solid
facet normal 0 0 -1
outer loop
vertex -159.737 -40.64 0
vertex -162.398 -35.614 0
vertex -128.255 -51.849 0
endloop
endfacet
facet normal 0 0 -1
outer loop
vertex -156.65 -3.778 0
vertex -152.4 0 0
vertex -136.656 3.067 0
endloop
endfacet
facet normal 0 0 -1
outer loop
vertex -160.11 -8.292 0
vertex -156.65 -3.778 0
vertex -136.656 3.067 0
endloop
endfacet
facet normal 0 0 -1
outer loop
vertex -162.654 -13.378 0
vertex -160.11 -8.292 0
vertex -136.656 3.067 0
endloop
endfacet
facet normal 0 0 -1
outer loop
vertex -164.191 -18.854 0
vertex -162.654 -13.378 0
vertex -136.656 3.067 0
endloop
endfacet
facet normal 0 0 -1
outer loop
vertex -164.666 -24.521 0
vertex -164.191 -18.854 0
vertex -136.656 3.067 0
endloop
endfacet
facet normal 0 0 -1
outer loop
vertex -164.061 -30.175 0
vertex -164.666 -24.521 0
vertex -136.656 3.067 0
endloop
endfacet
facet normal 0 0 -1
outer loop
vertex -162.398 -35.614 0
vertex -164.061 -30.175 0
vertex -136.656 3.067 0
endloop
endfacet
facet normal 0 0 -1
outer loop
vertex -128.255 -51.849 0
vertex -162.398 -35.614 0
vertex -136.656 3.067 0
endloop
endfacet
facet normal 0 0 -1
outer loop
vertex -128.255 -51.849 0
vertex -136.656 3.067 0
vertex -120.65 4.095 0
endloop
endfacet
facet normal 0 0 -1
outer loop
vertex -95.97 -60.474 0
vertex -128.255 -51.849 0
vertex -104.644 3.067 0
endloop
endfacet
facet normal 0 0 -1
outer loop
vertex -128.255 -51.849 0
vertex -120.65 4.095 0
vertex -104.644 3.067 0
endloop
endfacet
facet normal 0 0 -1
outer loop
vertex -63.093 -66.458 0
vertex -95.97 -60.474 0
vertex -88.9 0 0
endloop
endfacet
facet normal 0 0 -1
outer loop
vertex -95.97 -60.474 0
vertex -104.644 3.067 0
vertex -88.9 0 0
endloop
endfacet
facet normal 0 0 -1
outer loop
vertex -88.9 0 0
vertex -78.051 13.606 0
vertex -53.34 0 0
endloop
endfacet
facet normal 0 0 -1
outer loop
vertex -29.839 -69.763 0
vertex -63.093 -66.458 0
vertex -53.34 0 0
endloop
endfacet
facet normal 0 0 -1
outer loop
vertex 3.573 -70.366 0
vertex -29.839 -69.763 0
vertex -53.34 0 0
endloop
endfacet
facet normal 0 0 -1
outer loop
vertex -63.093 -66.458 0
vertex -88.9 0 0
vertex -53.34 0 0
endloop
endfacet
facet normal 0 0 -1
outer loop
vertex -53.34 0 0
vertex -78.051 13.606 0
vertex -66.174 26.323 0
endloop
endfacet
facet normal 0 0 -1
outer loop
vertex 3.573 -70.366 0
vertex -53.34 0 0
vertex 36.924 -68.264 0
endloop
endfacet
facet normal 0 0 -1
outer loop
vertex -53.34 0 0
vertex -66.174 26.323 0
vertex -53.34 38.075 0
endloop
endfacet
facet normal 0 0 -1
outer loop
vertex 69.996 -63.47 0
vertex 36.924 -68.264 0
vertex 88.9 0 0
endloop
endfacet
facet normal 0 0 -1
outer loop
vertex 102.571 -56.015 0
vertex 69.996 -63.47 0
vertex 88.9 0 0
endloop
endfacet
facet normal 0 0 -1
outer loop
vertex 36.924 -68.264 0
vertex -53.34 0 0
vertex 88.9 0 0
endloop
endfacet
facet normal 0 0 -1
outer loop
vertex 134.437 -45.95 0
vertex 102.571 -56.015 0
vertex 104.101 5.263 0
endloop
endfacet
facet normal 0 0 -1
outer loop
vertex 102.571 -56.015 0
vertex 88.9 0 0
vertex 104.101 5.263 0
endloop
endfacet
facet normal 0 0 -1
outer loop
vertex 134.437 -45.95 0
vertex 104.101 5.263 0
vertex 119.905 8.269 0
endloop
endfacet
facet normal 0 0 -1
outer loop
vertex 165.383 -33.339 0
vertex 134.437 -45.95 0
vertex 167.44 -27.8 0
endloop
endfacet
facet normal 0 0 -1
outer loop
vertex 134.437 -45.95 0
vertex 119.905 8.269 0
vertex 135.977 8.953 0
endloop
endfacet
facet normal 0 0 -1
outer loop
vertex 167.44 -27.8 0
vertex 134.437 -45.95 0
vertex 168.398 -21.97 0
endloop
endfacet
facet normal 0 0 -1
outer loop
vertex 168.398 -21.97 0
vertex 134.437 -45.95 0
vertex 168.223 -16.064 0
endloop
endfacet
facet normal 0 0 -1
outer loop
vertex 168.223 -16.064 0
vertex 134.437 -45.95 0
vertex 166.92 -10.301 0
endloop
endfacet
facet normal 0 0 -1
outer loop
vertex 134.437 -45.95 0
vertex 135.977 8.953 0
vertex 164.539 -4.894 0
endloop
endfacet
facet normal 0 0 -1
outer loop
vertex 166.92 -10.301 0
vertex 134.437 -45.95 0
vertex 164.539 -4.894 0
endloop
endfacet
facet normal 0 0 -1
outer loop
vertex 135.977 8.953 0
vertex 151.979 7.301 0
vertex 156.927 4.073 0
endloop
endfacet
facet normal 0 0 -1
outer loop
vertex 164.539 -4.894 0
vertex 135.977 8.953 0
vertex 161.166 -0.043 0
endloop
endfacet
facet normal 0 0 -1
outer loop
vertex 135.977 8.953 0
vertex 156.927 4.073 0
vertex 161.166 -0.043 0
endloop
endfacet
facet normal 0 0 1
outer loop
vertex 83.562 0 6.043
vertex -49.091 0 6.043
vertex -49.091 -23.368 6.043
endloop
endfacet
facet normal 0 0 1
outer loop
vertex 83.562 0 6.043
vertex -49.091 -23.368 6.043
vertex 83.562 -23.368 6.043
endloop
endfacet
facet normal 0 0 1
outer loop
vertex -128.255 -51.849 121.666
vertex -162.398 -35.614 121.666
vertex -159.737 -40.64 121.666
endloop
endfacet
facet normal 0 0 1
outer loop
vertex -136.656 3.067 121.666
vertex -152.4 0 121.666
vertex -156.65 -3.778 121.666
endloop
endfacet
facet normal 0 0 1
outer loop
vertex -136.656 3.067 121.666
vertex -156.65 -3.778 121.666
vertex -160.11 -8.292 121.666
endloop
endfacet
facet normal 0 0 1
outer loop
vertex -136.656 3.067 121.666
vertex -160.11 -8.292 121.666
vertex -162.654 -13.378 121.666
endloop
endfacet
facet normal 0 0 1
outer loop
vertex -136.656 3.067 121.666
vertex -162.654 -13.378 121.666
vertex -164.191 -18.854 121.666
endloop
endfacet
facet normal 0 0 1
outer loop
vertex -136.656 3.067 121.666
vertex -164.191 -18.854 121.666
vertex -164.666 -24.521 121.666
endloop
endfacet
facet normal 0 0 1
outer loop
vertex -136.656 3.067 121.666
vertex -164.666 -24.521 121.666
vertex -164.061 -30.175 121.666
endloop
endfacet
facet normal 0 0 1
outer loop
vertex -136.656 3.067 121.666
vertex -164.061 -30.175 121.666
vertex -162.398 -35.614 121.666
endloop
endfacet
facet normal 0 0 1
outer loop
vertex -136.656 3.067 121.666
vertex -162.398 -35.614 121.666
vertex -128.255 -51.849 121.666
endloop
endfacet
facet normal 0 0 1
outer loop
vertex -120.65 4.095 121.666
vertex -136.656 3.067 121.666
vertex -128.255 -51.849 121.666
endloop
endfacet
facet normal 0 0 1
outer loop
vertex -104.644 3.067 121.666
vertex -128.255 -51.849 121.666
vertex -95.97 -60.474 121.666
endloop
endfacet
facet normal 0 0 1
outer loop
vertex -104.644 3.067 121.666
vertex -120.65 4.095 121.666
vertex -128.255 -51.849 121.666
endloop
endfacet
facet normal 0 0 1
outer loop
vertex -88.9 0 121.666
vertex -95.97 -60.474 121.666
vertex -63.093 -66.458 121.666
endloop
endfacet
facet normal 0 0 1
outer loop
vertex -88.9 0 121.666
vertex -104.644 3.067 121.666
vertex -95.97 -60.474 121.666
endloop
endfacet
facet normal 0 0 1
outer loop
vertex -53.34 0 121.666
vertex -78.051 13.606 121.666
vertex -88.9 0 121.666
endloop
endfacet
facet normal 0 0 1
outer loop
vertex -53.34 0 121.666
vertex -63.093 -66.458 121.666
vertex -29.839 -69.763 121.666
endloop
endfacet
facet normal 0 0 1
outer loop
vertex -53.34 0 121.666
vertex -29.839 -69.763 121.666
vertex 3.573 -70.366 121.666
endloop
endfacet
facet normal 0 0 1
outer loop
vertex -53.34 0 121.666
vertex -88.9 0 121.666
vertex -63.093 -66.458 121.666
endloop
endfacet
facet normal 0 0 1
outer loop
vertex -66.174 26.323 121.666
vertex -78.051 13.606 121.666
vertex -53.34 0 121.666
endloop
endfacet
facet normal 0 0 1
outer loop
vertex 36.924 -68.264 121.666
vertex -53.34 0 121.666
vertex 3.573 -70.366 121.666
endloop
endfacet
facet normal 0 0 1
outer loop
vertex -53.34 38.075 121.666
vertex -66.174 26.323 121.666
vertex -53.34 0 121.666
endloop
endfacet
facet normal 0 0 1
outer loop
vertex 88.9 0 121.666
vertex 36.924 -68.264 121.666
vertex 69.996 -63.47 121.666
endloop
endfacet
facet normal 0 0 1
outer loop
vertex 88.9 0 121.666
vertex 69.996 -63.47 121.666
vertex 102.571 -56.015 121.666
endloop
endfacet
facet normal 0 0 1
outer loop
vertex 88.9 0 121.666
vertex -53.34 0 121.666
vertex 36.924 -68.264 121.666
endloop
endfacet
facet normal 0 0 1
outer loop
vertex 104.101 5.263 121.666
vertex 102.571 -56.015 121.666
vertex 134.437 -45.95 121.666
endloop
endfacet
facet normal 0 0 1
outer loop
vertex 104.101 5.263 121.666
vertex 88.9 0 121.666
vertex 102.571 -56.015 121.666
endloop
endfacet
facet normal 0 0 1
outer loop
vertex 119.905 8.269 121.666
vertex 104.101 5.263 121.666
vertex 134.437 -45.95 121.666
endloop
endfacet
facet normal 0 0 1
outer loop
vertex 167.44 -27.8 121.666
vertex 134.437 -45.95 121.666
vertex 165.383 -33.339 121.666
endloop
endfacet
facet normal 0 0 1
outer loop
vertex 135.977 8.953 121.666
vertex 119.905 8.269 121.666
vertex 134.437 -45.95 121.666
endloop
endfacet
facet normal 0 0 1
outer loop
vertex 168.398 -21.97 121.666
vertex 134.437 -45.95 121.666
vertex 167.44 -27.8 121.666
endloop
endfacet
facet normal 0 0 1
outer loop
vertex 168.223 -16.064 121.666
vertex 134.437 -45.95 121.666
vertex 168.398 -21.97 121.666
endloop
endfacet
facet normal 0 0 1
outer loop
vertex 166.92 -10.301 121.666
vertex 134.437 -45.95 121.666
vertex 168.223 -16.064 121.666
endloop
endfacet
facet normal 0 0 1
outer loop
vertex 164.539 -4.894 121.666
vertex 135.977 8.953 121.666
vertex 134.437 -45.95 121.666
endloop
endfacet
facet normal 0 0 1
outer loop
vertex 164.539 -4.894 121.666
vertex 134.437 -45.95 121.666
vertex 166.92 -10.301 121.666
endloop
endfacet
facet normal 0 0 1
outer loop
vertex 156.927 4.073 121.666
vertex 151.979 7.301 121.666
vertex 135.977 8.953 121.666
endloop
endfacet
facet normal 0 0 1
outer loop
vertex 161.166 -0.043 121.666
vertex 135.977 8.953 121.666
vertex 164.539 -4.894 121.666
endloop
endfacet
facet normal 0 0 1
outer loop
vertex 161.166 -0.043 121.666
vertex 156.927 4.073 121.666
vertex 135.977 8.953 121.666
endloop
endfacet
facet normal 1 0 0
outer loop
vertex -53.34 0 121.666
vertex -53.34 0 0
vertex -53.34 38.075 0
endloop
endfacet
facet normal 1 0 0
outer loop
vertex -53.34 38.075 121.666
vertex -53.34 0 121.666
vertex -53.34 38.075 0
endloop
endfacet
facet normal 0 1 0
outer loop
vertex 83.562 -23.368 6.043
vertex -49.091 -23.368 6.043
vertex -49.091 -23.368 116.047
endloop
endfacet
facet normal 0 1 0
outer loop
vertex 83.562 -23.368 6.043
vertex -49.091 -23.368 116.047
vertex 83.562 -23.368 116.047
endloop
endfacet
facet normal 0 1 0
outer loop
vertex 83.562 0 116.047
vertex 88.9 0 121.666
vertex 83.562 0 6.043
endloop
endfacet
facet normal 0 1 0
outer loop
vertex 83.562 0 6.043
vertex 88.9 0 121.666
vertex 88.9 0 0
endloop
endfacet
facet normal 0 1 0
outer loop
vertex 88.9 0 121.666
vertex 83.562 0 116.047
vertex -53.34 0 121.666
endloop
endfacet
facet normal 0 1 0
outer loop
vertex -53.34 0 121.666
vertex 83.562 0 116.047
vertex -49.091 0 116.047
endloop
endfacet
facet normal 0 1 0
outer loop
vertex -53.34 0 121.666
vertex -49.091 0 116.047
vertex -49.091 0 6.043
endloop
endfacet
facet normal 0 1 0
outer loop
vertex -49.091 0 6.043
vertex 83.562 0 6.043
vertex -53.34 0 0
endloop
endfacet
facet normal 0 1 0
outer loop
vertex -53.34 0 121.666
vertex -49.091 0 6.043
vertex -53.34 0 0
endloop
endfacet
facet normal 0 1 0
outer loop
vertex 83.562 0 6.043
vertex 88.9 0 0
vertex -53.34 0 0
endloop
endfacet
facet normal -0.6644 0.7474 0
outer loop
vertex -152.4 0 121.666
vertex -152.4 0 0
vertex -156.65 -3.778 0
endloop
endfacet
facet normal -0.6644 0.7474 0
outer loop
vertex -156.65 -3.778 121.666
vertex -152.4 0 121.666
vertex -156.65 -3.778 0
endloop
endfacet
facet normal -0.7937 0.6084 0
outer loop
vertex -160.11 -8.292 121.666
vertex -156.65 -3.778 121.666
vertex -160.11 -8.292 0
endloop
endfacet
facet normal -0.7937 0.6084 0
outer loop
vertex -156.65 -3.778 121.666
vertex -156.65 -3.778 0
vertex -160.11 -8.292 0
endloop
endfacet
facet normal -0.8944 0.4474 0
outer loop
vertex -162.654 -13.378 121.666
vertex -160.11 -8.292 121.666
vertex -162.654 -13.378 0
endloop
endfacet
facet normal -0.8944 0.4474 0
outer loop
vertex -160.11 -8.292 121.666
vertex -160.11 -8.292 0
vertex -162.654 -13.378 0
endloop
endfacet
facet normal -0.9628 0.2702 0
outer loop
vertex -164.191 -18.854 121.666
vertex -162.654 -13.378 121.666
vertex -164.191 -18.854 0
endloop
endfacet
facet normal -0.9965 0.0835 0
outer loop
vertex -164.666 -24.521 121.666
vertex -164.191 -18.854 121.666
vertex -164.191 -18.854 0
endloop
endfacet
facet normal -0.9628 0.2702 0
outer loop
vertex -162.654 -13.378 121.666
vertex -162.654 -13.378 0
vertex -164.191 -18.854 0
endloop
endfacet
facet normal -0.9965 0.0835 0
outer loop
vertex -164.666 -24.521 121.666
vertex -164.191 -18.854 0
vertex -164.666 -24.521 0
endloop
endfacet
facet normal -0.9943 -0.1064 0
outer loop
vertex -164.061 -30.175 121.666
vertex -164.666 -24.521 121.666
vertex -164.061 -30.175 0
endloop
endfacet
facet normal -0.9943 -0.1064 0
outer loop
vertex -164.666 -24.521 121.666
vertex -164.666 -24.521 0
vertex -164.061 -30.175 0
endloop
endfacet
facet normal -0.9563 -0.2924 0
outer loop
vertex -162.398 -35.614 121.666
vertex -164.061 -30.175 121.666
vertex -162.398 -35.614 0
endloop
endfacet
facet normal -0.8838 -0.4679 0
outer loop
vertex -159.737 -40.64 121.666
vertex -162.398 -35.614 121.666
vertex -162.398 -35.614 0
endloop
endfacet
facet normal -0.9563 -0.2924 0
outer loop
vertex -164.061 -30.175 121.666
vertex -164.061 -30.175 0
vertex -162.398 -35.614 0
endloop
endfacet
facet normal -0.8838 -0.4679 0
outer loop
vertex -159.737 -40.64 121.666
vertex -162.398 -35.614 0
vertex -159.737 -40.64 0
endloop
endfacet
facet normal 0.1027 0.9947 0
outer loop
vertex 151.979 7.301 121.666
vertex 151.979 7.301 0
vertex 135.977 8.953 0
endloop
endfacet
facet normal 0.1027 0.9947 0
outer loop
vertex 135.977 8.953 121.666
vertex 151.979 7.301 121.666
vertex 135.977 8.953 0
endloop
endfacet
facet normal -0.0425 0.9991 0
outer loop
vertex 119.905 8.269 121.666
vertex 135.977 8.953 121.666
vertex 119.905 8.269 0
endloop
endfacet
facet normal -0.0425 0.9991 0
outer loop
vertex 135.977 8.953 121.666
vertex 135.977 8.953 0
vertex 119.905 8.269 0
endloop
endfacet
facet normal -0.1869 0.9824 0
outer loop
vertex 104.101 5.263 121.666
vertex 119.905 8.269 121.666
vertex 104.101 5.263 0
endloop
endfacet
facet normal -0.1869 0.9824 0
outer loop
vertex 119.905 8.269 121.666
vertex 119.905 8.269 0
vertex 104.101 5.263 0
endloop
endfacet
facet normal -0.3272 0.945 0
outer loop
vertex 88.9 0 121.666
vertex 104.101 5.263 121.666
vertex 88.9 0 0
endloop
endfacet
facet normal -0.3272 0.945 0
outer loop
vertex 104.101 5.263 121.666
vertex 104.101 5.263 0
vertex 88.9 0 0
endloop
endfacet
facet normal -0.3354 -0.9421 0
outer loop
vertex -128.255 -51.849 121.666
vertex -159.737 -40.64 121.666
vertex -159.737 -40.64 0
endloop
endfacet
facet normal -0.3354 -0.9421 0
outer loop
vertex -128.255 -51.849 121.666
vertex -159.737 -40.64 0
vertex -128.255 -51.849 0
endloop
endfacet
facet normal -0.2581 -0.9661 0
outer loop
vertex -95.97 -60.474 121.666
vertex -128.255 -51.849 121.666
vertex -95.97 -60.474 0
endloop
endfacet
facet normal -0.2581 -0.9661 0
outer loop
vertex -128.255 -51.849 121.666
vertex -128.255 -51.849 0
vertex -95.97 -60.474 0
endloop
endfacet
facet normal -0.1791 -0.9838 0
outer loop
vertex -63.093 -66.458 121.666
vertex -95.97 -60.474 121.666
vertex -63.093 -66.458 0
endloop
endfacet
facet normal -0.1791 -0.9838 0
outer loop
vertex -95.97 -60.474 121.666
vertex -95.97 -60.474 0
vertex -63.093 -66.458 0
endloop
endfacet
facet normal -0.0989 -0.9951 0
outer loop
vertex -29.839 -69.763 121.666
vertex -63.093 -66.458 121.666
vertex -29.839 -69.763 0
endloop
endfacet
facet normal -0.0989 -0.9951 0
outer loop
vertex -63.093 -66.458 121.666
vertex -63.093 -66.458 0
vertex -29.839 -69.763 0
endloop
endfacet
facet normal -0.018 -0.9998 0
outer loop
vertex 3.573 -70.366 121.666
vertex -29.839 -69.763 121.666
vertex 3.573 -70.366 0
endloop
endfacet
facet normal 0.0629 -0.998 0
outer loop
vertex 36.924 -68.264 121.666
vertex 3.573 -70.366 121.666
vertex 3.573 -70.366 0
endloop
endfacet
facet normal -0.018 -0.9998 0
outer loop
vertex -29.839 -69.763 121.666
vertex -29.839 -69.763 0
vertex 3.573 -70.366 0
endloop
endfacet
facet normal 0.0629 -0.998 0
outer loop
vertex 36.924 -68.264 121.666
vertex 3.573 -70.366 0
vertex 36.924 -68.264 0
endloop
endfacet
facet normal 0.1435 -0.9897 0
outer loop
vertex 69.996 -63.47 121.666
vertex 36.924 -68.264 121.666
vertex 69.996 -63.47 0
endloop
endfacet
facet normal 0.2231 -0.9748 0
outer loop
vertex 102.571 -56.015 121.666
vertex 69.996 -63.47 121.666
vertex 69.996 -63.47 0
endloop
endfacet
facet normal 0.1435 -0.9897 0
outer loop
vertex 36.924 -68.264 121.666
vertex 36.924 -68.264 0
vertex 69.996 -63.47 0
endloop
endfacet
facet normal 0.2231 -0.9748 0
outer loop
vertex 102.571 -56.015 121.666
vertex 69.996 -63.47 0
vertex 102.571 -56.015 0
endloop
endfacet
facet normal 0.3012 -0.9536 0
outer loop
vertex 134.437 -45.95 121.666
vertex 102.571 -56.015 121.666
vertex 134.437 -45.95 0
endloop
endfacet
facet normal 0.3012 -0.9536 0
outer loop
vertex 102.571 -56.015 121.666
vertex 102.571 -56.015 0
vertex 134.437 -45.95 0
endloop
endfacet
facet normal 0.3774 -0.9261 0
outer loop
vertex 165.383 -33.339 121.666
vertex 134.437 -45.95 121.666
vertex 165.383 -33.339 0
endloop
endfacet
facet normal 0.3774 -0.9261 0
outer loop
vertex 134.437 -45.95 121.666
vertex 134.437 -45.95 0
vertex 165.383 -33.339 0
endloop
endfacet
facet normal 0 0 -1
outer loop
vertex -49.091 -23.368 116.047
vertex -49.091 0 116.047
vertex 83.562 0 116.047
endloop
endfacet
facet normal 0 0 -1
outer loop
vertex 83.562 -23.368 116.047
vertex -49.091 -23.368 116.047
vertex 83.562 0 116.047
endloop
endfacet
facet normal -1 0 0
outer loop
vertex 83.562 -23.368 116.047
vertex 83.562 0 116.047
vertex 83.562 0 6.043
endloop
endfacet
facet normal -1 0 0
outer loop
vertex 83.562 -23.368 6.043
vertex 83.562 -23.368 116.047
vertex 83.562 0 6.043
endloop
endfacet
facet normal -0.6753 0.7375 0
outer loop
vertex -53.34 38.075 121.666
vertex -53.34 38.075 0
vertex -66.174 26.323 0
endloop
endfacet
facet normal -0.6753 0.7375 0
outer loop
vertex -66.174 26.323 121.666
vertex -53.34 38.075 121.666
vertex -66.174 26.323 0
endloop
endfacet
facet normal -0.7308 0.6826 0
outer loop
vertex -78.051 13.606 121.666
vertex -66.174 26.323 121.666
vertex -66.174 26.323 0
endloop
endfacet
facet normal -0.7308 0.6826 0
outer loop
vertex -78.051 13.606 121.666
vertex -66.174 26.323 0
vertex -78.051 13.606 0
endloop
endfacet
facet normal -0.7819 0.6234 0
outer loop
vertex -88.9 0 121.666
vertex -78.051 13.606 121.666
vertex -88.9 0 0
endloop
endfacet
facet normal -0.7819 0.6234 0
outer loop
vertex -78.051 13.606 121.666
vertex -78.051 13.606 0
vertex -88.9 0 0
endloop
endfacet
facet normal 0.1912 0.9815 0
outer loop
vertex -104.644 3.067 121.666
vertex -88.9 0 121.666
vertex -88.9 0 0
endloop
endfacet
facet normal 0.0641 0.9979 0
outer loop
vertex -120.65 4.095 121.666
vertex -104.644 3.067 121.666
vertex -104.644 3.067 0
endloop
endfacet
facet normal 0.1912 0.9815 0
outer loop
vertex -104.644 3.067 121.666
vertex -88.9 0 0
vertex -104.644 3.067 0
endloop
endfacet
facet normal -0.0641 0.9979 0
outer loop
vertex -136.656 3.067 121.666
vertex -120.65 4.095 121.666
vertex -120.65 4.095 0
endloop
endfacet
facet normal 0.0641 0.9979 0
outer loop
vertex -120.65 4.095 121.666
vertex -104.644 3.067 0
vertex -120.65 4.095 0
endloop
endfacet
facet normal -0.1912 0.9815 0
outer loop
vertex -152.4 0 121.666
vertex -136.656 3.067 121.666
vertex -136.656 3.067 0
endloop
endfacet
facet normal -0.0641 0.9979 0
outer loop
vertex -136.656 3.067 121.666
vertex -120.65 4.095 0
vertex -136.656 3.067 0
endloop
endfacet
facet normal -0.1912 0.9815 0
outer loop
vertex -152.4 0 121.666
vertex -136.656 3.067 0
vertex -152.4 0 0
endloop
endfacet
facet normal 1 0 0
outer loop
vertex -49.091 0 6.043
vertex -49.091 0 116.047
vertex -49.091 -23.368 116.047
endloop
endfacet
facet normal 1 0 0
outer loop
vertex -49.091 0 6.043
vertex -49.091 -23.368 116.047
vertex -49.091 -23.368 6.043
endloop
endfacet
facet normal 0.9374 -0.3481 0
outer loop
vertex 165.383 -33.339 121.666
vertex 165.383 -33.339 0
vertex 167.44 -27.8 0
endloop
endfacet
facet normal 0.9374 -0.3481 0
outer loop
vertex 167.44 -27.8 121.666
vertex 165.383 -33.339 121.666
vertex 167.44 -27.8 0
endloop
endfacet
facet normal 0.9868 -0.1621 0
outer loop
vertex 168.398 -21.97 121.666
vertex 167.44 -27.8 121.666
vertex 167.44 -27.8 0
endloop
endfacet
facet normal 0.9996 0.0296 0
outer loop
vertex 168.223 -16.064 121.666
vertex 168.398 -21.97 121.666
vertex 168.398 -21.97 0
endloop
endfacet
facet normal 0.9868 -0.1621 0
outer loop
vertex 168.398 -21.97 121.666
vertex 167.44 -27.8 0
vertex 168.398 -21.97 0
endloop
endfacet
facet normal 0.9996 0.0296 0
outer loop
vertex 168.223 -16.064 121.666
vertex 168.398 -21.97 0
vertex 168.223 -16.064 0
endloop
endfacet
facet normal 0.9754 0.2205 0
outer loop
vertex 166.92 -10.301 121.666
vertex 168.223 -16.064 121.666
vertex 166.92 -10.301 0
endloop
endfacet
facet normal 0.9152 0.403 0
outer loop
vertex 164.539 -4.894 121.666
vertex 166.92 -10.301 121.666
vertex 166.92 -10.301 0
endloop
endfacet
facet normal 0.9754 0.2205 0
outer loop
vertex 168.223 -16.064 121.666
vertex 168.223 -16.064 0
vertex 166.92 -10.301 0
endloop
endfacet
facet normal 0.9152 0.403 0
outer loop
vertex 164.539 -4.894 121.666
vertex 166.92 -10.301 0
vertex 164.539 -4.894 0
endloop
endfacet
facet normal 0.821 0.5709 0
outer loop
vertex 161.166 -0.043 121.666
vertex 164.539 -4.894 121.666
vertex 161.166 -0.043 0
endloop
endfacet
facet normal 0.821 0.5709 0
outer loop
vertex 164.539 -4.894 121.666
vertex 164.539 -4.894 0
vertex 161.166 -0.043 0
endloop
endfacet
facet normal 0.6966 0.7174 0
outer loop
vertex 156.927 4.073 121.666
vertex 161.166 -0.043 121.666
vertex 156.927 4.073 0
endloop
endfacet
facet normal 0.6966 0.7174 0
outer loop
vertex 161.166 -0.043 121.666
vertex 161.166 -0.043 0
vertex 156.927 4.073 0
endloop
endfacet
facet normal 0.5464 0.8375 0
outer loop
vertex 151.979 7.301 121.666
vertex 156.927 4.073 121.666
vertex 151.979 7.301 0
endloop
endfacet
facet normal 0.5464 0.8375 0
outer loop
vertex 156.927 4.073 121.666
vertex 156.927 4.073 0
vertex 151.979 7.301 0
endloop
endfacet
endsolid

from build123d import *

# Parameters (mm, degrees)
BOSS_EXTRUDE2_DEPTH     = 121.666
SKETCH4_W               = 132.653422834
SKETCH4_H               = 110.004689212
CUT_EXTRUDE1_DEPTH      = 34.29
CUT_EXTRUDE1_DEPTH_BACK = 23.368


with BuildPart() as part:
    # Sketch2 → Boss-Extrude2 (new body)
    with BuildSketch(Plane.XY):
        with BuildLine():
            Line((88.9, 0), (-53.34, 0))
            Line((-53.34, 0), (-53.34, 38.074701195))
            ThreePointArc((-53.34, 38.074701195), (-72.236919303, 20.080501277), (-88.9, 0))
            ThreePointArc((-88.9, 0), (-120.65, 4.094872711), (-152.4, 0))
            ThreePointArc((-152.4, 0), (-164.191323146, -18.853572603), (-159.736653386, -40.64))
            ThreePointArc((-159.736653386, -40.64), (3.572889221, -70.366104417), (165.383346614, -33.33876494))
            ThreePointArc((165.383346614, -33.33876494), (166.92020334, -10.301221175), (151.978855147, 7.30123506))
            ThreePointArc((151.978855147, 7.30123506), (119.904882148, 8.268810644), (88.9, 0))
        make_face()
    extrude(amount=BOSS_EXTRUDE2_DEPTH)

    # Sketch4 → Cut-Extrude1 (cut, two sides)
    with BuildSketch(Plane(origin=(0, 0, 0), x_dir=(1, 0, 0), z_dir=(0, 1, 0))) as cut_extrude1_sk:
        with Locations((17.235431011, -61.044907142)):
            Rectangle(SKETCH4_W, SKETCH4_H)
    extrude(amount=CUT_EXTRUDE1_DEPTH, mode=Mode.SUBTRACT)
    extrude(cut_extrude1_sk.sketch, amount=-CUT_EXTRUDE1_DEPTH_BACK, mode=Mode.SUBTRACT)


solid = part.part
